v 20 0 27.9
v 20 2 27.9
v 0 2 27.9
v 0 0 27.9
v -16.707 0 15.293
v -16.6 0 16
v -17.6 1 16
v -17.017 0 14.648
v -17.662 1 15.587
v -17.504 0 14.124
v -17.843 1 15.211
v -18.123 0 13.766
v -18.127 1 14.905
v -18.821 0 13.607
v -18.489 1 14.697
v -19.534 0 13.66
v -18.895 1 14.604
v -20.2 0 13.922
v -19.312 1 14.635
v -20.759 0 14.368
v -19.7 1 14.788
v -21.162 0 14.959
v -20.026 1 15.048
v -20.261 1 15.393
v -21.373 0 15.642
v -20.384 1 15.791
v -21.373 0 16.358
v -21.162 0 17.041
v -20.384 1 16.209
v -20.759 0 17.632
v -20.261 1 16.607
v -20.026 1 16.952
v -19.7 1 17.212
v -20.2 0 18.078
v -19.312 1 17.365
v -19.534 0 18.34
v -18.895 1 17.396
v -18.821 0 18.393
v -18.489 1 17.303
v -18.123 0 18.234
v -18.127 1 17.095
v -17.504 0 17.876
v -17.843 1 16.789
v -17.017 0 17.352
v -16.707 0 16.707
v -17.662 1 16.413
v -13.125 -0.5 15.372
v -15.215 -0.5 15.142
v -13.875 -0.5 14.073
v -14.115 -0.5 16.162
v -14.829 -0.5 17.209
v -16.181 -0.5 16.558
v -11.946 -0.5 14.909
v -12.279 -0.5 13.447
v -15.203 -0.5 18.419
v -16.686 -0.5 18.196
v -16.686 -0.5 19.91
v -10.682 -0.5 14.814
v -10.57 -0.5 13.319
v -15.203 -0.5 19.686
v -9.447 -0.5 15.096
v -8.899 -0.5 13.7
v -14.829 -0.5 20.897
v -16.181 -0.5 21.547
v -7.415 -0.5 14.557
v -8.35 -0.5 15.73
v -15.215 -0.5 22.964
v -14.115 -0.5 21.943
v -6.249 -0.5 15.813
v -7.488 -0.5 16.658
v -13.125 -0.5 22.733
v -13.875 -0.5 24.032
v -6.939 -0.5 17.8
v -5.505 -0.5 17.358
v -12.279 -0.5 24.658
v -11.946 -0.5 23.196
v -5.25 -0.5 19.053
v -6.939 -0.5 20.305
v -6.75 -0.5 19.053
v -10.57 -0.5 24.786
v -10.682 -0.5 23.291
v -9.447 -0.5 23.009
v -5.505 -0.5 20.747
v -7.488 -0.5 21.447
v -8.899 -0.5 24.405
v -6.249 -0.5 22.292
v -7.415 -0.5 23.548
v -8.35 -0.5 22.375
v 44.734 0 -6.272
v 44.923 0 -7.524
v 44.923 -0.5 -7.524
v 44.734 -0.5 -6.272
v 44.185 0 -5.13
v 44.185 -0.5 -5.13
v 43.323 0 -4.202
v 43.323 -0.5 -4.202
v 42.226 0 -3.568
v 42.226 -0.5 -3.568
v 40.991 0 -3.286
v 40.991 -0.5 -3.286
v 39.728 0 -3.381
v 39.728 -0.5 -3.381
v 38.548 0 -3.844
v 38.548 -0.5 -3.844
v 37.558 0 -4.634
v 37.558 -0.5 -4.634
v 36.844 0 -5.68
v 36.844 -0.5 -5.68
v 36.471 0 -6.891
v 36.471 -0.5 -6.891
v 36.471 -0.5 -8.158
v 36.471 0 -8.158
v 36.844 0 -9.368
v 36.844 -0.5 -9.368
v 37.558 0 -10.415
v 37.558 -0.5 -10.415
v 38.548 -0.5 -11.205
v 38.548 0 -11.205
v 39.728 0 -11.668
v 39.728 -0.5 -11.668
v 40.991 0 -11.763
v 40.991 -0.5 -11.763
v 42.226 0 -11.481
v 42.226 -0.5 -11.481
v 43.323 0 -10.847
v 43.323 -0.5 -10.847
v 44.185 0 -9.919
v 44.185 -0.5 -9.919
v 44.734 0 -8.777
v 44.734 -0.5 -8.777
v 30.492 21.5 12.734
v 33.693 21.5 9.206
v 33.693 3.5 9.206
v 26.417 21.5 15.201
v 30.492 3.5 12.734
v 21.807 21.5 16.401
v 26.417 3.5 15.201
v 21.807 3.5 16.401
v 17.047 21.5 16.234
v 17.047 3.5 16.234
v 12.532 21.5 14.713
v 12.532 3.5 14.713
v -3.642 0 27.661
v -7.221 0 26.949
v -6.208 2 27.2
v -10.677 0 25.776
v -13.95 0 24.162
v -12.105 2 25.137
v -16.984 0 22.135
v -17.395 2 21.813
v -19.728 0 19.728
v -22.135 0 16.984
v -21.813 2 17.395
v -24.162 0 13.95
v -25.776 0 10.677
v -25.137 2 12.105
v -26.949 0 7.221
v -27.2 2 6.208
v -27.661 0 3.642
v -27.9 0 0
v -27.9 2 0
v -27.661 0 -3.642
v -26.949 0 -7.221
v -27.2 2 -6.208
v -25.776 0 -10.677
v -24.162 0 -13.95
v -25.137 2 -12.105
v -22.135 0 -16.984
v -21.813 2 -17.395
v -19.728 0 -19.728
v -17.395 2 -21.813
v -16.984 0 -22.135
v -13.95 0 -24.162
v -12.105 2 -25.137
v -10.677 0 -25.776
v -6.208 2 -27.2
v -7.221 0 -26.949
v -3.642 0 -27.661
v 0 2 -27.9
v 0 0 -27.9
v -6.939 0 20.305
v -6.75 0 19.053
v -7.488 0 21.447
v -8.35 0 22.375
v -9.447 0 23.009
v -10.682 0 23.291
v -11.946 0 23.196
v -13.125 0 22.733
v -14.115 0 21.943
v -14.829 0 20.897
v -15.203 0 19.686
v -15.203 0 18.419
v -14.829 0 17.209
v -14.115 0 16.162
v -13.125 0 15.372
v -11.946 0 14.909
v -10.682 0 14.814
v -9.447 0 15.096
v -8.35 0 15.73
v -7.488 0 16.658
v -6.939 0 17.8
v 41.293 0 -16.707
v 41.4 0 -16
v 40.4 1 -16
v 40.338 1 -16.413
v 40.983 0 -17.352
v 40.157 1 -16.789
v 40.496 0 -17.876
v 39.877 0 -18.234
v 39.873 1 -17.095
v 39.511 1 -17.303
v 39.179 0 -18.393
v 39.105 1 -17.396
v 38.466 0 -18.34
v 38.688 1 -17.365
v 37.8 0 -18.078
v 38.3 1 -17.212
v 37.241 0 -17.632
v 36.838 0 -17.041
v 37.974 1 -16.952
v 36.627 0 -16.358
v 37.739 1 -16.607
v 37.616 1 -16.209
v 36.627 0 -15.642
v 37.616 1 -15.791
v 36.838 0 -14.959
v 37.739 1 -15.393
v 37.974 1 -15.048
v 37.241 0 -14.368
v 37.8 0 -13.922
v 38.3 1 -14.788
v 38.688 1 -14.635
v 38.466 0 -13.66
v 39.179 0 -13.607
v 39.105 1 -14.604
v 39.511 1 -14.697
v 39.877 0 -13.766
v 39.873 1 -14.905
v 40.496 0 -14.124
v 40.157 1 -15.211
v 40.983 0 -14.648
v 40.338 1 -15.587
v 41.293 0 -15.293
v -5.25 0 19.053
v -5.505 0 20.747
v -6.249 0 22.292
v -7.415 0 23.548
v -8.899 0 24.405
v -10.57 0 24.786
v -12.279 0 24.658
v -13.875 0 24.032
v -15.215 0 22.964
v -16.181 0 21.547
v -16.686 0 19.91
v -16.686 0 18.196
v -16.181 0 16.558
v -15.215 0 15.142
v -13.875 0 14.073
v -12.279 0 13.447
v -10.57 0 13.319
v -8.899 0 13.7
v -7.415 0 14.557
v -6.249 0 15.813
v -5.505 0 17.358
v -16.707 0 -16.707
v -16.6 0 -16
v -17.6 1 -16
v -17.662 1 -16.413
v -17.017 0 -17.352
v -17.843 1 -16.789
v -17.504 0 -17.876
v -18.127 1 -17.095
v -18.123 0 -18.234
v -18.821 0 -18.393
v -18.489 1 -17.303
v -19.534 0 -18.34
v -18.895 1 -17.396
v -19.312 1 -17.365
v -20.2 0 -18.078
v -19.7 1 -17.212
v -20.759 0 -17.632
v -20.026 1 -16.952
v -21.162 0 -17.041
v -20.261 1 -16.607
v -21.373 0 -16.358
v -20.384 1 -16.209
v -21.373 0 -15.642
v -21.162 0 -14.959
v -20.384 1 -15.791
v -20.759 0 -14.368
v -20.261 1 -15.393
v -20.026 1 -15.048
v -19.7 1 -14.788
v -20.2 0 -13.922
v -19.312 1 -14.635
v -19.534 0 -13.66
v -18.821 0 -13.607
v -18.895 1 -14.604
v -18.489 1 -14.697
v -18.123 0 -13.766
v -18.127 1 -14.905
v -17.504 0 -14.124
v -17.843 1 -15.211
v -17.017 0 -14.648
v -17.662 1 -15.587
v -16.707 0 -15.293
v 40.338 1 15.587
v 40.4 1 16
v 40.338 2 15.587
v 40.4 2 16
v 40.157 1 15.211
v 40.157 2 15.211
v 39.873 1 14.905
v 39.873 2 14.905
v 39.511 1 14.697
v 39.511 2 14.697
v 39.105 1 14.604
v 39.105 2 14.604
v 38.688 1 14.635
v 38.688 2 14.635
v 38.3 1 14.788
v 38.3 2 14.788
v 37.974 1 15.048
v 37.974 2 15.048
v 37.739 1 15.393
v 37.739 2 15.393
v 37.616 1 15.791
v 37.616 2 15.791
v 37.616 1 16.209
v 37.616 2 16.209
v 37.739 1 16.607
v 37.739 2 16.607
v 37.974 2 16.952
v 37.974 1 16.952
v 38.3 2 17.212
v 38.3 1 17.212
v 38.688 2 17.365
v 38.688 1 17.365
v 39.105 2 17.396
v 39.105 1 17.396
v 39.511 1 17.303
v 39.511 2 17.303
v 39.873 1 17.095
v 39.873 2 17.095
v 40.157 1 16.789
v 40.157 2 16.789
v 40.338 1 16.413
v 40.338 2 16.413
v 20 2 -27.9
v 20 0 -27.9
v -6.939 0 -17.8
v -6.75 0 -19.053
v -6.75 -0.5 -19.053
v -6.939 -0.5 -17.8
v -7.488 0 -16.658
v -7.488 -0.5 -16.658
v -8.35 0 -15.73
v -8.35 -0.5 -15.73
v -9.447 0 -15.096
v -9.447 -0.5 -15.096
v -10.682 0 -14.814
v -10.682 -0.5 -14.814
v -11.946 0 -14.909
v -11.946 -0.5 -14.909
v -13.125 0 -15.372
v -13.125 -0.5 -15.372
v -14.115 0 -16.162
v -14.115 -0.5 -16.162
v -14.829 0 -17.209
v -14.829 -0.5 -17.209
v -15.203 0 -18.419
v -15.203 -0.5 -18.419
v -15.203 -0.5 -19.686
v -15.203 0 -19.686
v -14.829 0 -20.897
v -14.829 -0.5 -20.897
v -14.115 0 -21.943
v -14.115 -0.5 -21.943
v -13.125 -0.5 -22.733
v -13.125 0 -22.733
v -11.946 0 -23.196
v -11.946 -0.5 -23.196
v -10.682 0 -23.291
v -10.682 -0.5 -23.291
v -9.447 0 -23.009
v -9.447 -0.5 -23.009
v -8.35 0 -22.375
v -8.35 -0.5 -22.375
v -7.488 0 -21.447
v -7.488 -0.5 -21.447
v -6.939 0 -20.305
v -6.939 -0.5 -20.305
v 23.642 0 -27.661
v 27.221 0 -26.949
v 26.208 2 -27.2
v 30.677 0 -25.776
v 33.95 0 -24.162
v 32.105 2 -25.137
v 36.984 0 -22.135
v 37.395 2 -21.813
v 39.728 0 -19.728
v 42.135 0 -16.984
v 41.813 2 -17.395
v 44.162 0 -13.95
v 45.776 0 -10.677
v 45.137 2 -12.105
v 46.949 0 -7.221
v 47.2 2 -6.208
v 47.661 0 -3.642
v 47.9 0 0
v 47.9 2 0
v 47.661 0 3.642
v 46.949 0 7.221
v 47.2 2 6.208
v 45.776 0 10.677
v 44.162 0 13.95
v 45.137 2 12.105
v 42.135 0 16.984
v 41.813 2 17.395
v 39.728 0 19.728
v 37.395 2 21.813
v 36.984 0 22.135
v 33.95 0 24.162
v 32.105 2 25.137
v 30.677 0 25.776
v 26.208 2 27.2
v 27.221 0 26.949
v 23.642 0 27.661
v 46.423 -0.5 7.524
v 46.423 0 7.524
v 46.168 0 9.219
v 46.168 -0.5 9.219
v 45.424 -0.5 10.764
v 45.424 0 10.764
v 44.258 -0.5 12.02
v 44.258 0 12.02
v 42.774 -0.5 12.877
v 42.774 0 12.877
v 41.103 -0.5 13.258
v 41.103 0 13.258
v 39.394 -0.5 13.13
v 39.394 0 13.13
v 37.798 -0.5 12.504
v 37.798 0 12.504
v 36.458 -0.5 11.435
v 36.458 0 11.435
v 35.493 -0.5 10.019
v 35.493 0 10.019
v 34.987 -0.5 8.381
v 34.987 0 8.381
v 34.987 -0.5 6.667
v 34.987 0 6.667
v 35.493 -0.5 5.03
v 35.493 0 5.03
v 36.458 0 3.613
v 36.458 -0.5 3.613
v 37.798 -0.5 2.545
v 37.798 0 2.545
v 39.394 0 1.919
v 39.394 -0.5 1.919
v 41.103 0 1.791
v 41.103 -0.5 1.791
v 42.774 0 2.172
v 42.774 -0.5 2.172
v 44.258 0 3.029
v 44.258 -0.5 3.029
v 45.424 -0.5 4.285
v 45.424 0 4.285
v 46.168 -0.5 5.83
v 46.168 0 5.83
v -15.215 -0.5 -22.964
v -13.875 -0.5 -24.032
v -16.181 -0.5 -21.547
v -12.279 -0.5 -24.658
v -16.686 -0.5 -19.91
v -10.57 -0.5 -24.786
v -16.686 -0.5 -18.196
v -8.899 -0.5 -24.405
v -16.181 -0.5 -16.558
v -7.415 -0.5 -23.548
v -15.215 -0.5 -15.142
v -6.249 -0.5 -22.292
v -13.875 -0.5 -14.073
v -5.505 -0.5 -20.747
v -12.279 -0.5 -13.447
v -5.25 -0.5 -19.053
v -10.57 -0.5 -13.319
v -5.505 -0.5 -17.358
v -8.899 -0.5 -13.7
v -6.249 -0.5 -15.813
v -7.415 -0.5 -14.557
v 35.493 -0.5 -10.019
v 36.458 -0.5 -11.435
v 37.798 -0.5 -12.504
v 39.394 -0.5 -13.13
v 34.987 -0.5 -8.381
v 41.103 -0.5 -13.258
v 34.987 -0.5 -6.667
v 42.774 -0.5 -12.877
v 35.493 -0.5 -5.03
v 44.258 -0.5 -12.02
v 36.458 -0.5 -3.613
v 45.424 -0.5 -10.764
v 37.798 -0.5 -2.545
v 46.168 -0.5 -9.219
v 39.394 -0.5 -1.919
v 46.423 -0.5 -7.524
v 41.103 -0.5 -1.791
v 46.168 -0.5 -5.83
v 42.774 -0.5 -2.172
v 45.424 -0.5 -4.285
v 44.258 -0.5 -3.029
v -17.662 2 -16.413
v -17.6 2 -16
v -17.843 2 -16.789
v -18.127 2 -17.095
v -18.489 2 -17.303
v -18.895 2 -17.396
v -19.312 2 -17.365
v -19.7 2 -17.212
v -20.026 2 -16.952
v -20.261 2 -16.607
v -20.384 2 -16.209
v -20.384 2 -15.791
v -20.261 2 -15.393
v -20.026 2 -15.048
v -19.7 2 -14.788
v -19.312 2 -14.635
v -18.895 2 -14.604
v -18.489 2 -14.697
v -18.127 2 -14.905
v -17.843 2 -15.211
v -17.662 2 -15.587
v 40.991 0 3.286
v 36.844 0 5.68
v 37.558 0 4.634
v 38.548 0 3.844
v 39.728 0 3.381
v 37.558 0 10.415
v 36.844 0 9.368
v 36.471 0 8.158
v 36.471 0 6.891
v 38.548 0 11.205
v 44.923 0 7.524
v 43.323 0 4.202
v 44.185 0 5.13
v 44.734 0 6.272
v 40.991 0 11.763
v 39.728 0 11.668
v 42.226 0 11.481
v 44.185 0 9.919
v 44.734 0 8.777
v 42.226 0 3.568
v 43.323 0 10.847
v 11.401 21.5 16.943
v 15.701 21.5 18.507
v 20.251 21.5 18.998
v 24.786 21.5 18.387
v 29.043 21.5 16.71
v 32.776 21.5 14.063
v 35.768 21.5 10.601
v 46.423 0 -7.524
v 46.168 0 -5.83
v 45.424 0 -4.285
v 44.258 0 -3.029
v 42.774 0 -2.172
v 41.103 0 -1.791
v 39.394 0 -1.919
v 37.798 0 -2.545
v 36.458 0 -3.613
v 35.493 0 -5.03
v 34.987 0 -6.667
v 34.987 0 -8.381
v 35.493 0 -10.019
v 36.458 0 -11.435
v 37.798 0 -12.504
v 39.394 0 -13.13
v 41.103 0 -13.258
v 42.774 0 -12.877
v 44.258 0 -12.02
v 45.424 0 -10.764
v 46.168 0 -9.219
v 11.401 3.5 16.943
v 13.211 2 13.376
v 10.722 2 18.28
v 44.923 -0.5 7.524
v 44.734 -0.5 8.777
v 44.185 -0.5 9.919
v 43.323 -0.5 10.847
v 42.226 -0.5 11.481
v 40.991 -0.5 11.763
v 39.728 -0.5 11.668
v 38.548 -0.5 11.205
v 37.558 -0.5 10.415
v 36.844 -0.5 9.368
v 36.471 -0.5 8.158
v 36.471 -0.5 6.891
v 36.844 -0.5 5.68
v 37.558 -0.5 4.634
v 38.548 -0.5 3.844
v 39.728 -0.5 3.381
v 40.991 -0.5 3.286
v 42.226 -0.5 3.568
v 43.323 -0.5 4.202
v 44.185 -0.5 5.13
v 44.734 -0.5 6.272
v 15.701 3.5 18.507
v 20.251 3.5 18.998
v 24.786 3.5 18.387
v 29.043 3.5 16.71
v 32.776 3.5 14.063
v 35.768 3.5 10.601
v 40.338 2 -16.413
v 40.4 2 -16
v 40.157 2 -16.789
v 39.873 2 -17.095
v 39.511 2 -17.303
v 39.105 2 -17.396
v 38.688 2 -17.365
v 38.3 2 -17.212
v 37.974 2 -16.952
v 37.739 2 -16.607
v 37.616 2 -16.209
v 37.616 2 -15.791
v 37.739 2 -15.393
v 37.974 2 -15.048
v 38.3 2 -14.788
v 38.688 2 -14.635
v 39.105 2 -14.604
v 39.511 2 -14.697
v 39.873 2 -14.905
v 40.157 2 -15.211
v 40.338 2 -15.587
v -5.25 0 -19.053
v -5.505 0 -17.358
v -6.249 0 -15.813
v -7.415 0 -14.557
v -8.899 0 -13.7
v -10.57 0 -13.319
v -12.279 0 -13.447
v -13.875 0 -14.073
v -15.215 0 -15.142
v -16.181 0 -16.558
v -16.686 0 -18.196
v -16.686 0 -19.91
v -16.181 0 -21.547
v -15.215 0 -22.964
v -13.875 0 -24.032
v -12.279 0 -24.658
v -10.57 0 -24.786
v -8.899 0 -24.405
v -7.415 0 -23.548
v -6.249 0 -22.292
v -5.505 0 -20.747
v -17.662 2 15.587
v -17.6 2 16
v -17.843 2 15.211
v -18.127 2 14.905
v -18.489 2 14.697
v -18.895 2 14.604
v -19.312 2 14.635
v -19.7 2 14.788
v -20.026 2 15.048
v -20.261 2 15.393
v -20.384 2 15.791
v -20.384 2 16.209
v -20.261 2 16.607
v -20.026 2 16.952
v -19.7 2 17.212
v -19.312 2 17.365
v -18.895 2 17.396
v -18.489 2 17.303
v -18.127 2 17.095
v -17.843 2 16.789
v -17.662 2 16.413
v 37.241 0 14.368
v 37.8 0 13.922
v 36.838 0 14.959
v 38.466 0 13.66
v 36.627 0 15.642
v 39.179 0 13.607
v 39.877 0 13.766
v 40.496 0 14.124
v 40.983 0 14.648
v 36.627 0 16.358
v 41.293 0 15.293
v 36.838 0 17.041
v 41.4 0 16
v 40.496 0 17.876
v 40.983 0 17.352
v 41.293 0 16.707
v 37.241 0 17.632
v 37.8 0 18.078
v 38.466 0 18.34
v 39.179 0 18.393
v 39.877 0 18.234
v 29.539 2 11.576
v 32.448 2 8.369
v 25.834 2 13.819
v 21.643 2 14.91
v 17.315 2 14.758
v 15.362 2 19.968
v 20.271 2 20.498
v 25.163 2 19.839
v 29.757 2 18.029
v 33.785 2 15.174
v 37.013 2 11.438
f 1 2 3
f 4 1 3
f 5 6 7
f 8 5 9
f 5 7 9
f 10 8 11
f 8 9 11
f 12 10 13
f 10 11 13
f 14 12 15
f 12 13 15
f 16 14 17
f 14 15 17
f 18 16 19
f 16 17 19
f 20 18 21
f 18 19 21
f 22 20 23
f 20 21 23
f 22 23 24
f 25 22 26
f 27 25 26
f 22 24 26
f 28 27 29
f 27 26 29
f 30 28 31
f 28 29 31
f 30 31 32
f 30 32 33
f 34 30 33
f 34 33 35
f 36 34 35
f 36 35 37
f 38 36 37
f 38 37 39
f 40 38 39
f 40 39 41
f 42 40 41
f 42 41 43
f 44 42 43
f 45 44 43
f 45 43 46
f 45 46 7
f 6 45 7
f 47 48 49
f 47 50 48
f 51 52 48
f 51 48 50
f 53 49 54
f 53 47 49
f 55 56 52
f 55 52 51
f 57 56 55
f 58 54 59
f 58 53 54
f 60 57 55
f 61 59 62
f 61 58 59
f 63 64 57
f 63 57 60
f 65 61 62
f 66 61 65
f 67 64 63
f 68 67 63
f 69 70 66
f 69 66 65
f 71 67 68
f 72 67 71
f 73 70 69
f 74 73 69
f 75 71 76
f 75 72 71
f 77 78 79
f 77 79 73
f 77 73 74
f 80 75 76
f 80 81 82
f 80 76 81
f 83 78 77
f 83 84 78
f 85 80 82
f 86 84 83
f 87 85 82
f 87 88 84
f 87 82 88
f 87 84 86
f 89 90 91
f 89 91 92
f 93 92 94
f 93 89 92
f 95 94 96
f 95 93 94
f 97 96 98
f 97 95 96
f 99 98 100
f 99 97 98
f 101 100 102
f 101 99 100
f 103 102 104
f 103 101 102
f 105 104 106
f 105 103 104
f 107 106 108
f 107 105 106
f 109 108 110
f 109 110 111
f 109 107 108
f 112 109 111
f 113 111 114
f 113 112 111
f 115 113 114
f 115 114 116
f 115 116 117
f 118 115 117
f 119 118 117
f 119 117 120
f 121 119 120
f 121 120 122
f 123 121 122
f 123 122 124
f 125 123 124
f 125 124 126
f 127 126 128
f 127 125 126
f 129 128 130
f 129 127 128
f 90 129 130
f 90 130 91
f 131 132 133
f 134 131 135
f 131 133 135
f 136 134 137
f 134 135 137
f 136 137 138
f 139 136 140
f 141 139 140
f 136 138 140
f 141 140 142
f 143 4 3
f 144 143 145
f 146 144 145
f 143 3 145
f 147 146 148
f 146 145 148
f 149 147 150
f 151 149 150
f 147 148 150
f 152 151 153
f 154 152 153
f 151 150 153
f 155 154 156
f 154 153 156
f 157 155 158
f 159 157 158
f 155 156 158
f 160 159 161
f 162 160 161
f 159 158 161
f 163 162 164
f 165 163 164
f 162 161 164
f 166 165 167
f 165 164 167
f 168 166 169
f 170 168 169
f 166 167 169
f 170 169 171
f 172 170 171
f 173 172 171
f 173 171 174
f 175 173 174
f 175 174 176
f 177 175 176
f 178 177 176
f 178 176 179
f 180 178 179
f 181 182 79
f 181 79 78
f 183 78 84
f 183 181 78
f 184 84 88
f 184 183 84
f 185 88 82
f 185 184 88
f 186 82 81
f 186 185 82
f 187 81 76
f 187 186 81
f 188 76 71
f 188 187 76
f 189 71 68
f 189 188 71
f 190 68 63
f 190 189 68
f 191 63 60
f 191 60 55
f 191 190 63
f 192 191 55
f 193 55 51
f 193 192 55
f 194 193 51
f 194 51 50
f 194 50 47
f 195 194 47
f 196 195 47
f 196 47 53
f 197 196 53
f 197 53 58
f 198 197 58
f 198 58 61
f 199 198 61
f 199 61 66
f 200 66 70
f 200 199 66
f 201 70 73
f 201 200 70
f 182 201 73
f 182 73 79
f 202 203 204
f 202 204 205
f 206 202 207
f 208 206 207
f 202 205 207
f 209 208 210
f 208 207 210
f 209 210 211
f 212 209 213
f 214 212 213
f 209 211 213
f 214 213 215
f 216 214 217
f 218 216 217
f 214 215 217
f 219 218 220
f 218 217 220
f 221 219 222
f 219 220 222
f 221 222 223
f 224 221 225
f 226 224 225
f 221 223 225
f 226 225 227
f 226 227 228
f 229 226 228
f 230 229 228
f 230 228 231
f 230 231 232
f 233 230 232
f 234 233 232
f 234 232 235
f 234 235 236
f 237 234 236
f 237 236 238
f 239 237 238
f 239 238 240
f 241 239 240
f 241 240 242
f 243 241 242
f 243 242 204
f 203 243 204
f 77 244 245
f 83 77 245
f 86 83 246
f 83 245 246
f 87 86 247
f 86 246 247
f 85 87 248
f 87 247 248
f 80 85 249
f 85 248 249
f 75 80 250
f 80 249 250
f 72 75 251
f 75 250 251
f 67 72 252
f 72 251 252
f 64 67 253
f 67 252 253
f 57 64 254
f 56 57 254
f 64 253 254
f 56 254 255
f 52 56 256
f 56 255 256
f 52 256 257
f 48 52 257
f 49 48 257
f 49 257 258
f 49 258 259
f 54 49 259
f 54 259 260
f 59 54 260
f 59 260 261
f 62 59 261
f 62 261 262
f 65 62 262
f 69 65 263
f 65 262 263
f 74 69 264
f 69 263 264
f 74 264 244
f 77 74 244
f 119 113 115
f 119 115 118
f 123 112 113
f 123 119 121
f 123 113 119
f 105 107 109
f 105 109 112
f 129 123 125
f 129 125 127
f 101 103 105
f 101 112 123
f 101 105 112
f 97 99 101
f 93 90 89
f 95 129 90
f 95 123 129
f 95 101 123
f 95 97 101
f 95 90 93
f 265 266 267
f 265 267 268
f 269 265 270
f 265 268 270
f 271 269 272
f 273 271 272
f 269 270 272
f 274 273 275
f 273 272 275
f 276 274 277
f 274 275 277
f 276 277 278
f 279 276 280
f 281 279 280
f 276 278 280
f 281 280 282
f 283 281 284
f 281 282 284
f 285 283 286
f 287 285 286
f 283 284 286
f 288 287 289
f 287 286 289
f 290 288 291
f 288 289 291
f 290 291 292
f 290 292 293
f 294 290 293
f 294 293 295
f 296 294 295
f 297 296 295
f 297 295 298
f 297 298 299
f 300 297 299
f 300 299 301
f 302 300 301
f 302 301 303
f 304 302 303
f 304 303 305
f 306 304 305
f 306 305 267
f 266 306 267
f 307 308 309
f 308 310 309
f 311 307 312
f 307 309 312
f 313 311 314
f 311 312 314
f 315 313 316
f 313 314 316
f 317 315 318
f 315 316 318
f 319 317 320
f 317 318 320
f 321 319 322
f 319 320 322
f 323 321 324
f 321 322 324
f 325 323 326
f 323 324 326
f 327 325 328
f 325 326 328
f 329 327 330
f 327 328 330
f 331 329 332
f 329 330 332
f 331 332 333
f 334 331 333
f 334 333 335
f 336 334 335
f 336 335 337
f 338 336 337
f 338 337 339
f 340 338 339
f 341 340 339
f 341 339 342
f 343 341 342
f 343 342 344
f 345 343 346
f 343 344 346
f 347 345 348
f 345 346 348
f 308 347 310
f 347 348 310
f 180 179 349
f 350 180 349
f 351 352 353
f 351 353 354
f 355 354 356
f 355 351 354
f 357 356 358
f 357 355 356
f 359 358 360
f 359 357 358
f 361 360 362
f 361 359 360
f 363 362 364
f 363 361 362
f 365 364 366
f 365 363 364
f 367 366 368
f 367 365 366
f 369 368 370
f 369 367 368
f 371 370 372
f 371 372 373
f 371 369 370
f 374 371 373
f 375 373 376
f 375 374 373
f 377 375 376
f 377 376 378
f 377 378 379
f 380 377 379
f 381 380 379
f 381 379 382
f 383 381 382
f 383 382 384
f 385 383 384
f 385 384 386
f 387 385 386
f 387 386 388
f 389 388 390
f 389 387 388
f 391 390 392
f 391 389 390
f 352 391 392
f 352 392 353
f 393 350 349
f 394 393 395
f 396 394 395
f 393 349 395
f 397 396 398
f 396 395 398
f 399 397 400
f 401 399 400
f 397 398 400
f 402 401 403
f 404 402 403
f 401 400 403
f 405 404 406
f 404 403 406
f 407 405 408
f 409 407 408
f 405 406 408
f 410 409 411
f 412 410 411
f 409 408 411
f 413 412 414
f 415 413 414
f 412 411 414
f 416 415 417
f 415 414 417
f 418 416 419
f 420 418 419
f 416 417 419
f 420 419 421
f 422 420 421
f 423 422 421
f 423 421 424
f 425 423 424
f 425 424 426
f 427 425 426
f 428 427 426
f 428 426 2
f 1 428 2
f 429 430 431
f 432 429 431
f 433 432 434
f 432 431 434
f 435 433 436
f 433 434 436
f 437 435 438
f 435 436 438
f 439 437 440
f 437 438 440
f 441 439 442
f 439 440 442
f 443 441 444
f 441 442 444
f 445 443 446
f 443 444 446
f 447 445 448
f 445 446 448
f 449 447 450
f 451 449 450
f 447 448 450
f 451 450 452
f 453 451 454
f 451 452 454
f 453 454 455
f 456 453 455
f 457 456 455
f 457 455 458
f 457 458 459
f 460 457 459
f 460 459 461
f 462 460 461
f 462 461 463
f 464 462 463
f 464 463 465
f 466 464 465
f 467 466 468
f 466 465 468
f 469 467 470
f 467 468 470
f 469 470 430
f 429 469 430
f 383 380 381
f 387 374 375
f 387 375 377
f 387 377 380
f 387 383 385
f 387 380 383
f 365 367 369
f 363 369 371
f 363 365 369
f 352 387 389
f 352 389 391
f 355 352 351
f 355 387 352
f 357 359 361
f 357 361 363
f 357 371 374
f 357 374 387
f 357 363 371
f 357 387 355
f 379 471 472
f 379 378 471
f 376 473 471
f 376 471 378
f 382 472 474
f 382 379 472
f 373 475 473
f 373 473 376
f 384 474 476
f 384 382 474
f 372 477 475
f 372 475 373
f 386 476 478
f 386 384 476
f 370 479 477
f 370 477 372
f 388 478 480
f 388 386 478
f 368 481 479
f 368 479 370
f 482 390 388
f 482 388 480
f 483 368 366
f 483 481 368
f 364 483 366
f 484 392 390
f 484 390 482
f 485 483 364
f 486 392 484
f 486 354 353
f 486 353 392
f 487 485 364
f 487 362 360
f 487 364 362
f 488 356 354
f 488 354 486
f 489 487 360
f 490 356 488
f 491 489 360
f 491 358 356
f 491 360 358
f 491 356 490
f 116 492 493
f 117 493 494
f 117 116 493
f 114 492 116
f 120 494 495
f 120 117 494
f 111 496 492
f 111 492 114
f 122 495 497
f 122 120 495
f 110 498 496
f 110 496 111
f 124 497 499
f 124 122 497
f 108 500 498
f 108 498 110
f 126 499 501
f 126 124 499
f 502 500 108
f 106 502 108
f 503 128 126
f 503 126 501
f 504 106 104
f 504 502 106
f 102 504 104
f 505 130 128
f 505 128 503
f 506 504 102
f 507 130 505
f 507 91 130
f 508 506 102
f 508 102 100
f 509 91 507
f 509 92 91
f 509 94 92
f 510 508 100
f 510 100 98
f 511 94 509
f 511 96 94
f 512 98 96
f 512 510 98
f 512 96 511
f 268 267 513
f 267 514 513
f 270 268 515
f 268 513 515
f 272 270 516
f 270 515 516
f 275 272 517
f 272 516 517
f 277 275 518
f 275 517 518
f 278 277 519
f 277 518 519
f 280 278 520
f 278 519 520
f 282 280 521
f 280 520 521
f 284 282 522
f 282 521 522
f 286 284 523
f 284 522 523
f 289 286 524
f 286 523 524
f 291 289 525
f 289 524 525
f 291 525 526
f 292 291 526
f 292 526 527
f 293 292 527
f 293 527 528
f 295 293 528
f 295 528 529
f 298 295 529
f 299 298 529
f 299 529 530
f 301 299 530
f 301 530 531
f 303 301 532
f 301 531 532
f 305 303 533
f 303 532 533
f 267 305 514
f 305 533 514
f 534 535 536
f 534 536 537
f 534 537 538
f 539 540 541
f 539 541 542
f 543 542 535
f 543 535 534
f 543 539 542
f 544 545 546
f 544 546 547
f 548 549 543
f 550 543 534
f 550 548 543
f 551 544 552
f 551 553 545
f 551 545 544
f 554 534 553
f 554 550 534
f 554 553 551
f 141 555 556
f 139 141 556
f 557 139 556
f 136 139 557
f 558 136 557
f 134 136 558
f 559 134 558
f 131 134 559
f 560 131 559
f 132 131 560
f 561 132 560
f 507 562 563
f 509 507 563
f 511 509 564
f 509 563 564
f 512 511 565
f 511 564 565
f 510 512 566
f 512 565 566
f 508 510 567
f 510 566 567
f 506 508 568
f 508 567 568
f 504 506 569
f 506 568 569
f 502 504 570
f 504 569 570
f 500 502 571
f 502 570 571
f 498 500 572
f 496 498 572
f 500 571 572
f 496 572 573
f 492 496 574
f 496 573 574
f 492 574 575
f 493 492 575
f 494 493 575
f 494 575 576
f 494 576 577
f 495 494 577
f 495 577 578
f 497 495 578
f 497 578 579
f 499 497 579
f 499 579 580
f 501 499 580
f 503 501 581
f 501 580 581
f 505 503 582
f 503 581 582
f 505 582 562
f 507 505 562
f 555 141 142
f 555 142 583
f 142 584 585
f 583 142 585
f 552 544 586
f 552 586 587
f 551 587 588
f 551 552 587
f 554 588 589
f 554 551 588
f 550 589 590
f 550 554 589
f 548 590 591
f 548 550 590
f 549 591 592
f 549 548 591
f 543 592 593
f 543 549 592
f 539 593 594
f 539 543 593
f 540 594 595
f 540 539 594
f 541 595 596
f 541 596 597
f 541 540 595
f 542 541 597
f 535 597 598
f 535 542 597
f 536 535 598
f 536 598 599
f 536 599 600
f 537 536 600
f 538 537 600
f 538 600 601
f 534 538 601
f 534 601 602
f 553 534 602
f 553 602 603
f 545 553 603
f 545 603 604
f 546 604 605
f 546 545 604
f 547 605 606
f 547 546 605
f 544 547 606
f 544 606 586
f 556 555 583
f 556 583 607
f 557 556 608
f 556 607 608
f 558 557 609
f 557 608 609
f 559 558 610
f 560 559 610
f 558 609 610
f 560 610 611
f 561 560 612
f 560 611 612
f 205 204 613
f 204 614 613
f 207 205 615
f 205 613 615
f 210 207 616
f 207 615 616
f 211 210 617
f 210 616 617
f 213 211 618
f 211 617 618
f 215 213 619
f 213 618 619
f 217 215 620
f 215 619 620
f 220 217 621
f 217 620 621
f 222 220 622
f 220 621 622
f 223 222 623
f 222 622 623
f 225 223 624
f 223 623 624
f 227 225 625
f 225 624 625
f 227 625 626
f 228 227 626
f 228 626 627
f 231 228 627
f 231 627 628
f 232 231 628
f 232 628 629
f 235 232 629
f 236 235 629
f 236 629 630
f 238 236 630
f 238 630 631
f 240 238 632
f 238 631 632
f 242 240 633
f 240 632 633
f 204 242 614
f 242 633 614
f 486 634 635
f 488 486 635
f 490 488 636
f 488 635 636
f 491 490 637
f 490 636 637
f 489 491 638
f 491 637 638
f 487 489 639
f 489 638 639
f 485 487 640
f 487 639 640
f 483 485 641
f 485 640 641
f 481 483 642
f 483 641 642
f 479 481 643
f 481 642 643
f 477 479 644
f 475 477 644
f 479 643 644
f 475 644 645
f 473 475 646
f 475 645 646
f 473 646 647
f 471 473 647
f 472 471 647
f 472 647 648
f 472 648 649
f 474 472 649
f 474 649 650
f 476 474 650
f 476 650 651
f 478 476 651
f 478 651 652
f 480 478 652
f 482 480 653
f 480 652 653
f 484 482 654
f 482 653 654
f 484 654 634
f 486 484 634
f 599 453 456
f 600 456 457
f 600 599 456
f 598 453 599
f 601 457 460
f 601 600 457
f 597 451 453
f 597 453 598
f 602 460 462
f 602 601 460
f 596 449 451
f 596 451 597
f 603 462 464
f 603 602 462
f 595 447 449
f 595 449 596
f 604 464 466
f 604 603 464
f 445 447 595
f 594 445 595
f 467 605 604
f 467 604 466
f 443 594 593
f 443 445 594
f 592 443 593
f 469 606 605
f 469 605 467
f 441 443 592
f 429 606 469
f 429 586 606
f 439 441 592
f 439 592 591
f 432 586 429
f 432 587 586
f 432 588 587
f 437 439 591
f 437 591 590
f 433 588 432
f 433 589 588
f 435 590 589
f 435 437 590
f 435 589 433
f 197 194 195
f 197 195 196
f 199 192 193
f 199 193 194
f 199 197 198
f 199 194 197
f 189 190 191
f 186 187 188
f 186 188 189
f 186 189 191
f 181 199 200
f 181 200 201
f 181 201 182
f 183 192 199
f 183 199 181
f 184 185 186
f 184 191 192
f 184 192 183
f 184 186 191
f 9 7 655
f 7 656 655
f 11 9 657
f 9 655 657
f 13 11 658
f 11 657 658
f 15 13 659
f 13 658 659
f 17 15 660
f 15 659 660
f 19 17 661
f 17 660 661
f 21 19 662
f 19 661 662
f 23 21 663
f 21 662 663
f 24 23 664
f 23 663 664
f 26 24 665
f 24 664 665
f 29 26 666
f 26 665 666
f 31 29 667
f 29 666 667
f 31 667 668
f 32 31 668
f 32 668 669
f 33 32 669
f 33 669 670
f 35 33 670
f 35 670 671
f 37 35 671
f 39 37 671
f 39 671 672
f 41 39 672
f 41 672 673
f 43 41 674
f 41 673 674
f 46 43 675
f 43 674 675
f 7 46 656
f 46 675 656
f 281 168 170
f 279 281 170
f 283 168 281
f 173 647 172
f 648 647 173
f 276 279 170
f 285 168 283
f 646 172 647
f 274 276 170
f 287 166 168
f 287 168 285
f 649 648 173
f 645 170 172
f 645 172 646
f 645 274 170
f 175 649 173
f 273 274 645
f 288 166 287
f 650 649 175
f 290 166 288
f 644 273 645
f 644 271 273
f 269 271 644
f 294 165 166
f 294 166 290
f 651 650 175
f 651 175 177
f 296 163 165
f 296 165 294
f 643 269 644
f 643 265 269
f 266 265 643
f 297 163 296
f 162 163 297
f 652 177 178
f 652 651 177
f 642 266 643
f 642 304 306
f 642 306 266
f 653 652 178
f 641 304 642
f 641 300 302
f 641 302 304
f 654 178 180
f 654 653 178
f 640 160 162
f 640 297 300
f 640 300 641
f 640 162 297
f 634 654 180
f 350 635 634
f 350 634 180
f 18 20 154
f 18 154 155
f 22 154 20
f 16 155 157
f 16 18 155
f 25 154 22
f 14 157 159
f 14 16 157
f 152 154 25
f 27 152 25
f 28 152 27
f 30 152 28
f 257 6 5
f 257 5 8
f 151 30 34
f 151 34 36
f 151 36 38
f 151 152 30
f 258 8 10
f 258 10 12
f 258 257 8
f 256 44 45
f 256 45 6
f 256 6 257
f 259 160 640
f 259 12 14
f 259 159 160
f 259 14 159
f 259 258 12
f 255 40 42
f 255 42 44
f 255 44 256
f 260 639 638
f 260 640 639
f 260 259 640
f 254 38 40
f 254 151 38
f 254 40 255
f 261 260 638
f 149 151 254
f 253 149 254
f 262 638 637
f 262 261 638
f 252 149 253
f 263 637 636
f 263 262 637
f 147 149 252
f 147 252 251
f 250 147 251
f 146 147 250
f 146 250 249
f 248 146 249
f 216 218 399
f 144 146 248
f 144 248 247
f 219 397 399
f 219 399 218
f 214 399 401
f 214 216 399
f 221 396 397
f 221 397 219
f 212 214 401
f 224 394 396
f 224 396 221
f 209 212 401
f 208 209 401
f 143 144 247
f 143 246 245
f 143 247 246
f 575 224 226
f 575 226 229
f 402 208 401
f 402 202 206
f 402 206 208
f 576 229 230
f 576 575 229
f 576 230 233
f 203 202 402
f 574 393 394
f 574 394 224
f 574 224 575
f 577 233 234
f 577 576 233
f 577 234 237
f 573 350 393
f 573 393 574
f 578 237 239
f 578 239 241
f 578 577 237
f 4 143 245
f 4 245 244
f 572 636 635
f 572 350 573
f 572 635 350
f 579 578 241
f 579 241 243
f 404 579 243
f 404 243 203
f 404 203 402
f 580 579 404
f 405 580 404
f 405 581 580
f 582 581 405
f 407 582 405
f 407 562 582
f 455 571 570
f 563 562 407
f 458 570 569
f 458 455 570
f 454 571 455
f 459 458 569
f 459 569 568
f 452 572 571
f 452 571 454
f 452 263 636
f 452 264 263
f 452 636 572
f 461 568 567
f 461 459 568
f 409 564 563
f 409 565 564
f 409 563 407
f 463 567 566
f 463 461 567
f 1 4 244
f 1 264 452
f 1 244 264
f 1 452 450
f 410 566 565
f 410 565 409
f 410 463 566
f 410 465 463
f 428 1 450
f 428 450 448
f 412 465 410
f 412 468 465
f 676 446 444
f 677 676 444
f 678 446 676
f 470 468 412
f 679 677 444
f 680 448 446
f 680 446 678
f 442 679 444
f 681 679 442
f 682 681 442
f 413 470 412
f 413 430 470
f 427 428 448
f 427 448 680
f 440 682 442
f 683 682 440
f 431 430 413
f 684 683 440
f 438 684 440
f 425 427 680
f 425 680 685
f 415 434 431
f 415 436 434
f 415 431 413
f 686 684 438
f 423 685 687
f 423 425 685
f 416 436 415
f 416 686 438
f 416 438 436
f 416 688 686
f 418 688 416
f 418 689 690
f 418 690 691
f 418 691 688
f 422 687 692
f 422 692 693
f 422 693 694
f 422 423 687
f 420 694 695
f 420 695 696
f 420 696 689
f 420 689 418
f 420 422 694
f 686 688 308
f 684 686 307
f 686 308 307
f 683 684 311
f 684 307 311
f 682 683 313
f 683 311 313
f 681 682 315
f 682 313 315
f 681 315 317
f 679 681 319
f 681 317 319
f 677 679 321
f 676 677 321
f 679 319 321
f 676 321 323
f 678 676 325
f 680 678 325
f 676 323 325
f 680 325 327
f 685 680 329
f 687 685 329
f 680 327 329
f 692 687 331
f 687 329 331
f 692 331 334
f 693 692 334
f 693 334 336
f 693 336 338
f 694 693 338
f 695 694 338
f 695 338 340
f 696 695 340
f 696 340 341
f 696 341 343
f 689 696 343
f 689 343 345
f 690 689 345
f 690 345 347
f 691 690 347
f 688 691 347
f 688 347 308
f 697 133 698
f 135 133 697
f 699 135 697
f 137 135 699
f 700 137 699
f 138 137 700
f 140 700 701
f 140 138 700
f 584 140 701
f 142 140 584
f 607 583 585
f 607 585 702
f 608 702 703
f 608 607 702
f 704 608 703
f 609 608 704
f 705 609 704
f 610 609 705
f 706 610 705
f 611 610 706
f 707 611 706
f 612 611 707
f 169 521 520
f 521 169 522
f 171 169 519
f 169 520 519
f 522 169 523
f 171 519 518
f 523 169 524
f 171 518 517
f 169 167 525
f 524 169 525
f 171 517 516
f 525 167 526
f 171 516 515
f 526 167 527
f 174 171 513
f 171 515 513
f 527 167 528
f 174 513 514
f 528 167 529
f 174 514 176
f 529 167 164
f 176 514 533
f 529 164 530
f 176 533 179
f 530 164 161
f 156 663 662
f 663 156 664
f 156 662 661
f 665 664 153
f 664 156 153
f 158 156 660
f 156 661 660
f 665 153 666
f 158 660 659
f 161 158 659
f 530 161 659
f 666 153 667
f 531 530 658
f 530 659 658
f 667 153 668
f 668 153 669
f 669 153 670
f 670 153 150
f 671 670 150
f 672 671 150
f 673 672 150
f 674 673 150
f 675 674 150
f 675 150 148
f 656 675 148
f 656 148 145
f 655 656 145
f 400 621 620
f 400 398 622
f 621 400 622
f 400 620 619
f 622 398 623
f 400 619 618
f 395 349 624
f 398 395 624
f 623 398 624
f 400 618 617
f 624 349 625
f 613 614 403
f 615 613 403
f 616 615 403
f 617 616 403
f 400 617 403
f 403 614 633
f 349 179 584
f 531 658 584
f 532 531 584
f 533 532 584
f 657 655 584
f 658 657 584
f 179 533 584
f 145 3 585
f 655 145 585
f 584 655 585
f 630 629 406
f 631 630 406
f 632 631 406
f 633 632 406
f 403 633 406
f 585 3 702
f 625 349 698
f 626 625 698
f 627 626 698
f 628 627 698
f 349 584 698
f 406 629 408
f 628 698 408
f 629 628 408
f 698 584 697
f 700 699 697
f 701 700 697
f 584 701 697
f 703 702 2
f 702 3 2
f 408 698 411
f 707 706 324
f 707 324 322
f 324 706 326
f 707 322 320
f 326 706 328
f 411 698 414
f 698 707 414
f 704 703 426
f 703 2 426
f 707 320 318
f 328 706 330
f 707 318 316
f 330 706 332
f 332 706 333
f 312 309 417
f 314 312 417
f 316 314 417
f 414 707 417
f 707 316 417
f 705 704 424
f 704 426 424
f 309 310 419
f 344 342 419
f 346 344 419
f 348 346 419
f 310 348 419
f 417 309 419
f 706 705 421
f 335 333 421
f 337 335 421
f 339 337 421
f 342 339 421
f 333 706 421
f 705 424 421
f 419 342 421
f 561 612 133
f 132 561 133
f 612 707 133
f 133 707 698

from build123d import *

# Parameters (mm, degrees)
BOSS_EXTRUDE1_DEPTH                                  = 2
EXTRUDE_THIN2_DEPTH                                  = 19.5
CHAMFER1_SIZE                                        = 1.5
CSK_FOR_ST2_2_CROSS_RECESSED_CTSK_HEAD_T_D           = 2.8
CSK_FOR_ST2_2_CROSS_RECESSED_CTSK_HEAD_T_DEPTH       = 7.5
CSK_FOR_ST2_2_CROSS_RECESSED_CTSK_HEAD_T_CSINK_D     = 4.8
CSK_FOR_ST2_2_CROSS_RECESSED_CTSK_HEAD_T_CSINK_ANGLE = 90
CSK_FOR_ST2_2_CROSS_RECESSED_CTSK_HEAD_T_TIP         = 0.841204867
SKETCH4_R                                            = 5.75
SKETCH4_R_2                                          = 4.25
EXTRUDE_THIN1_DEPTH                                  = 0.5


with BuildPart() as part:
    # Sketch1 → Boss-Extrude1 (new body)
    with BuildSketch(Plane.XZ.offset(-2)):
        with BuildLine():
            Line((0, -27.9), (20, -27.9))
            ThreePointArc((20, -27.9), (47.9, 0), (20, 27.9))
            Line((20, 27.9), (0, 27.9))
            ThreePointArc((0, 27.9), (-27.9, 0), (0, -27.9))
        make_face()
    extrude(amount=BOSS_EXTRUDE1_DEPTH)

    # Sketch8 → Extrude-Thin2 (add)
    with BuildSketch(Plane(origin=(0, 2, 0), x_dir=(1, 0, 0), z_dir=(0, 1, 0))):
        with BuildLine():
            ThreePointArc((33.69302994, -9.206026887), (24.155985639, -15.968023778), (12.53247907, -14.71346768))
            Line((12.53247907, -14.71346768), (11.401036505, -16.942780965))
            ThreePointArc((11.401036505, -16.942780965), (24.785680433, -18.38742132), (35.767731446, -10.600879446))
            Line((35.767731446, -10.600879446), (33.69302994, -9.206026887))
        make_face()
    extrude(amount=EXTRUDE_THIN2_DEPTH)

    # Chamfer1
    chamfer1_edges = [part.edges().sort_by_distance(p)[0] for p in [
        (24.155985639, 2, 15.968023778),
        (24.785680433, 2, 18.38742132),
    ]]
    chamfer(chamfer1_edges, length=CHAMFER1_SIZE)

    # CSK for ST2.2 Cross recessed CTSK head tapping screws1
    with Locations(Plane(origin=(0, 0, 0), x_dir=(-1, 0, 0), z_dir=(0, -1, 0))):
        with Locations((-39, 16), (-39, -16), (19, -16), (19, 16)):
            CounterSinkHole(CSK_FOR_ST2_2_CROSS_RECESSED_CTSK_HEAD_T_D / 2, CSK_FOR_ST2_2_CROSS_RECESSED_CTSK_HEAD_T_CSINK_D / 2, depth=CSK_FOR_ST2_2_CROSS_RECESSED_CTSK_HEAD_T_DEPTH, counter_sink_angle=CSK_FOR_ST2_2_CROSS_RECESSED_CTSK_HEAD_T_CSINK_ANGLE)
            with Locations((0, 0, -(CSK_FOR_ST2_2_CROSS_RECESSED_CTSK_HEAD_T_DEPTH + CSK_FOR_ST2_2_CROSS_RECESSED_CTSK_HEAD_T_TIP / 2))):  # 118° drill point
                Cone(0, CSK_FOR_ST2_2_CROSS_RECESSED_CTSK_HEAD_T_D / 2, CSK_FOR_ST2_2_CROSS_RECESSED_CTSK_HEAD_T_TIP, mode=Mode.SUBTRACT)

    # Sketch4 → Extrude-Thin1 (add)
    with BuildSketch(Plane.XZ):
        with Locations((-11, 19.052558883)):
            Circle(SKETCH4_R)
        with Locations((-11, 19.052558883)):
            Circle(SKETCH4_R_2, mode=Mode.SUBTRACT)
        with Locations((-11, -19.052558883)):
            Circle(SKETCH4_R)
        with Locations((-11, -19.052558883)):
            Circle(SKETCH4_R_2, mode=Mode.SUBTRACT)
        with Locations((40.673237657, 7.524443153)):
            Circle(SKETCH4_R)
        with Locations((40.673237657, 7.524443153)):
            Circle(SKETCH4_R_2, mode=Mode.SUBTRACT)
        with Locations((40.673237657, -7.524443153)):
            Circle(SKETCH4_R)
        with Locations((40.673237657, -7.524443153)):
            Circle(SKETCH4_R_2, mode=Mode.SUBTRACT)
    extrude(amount=EXTRUDE_THIN1_DEPTH)


solid = part.part
